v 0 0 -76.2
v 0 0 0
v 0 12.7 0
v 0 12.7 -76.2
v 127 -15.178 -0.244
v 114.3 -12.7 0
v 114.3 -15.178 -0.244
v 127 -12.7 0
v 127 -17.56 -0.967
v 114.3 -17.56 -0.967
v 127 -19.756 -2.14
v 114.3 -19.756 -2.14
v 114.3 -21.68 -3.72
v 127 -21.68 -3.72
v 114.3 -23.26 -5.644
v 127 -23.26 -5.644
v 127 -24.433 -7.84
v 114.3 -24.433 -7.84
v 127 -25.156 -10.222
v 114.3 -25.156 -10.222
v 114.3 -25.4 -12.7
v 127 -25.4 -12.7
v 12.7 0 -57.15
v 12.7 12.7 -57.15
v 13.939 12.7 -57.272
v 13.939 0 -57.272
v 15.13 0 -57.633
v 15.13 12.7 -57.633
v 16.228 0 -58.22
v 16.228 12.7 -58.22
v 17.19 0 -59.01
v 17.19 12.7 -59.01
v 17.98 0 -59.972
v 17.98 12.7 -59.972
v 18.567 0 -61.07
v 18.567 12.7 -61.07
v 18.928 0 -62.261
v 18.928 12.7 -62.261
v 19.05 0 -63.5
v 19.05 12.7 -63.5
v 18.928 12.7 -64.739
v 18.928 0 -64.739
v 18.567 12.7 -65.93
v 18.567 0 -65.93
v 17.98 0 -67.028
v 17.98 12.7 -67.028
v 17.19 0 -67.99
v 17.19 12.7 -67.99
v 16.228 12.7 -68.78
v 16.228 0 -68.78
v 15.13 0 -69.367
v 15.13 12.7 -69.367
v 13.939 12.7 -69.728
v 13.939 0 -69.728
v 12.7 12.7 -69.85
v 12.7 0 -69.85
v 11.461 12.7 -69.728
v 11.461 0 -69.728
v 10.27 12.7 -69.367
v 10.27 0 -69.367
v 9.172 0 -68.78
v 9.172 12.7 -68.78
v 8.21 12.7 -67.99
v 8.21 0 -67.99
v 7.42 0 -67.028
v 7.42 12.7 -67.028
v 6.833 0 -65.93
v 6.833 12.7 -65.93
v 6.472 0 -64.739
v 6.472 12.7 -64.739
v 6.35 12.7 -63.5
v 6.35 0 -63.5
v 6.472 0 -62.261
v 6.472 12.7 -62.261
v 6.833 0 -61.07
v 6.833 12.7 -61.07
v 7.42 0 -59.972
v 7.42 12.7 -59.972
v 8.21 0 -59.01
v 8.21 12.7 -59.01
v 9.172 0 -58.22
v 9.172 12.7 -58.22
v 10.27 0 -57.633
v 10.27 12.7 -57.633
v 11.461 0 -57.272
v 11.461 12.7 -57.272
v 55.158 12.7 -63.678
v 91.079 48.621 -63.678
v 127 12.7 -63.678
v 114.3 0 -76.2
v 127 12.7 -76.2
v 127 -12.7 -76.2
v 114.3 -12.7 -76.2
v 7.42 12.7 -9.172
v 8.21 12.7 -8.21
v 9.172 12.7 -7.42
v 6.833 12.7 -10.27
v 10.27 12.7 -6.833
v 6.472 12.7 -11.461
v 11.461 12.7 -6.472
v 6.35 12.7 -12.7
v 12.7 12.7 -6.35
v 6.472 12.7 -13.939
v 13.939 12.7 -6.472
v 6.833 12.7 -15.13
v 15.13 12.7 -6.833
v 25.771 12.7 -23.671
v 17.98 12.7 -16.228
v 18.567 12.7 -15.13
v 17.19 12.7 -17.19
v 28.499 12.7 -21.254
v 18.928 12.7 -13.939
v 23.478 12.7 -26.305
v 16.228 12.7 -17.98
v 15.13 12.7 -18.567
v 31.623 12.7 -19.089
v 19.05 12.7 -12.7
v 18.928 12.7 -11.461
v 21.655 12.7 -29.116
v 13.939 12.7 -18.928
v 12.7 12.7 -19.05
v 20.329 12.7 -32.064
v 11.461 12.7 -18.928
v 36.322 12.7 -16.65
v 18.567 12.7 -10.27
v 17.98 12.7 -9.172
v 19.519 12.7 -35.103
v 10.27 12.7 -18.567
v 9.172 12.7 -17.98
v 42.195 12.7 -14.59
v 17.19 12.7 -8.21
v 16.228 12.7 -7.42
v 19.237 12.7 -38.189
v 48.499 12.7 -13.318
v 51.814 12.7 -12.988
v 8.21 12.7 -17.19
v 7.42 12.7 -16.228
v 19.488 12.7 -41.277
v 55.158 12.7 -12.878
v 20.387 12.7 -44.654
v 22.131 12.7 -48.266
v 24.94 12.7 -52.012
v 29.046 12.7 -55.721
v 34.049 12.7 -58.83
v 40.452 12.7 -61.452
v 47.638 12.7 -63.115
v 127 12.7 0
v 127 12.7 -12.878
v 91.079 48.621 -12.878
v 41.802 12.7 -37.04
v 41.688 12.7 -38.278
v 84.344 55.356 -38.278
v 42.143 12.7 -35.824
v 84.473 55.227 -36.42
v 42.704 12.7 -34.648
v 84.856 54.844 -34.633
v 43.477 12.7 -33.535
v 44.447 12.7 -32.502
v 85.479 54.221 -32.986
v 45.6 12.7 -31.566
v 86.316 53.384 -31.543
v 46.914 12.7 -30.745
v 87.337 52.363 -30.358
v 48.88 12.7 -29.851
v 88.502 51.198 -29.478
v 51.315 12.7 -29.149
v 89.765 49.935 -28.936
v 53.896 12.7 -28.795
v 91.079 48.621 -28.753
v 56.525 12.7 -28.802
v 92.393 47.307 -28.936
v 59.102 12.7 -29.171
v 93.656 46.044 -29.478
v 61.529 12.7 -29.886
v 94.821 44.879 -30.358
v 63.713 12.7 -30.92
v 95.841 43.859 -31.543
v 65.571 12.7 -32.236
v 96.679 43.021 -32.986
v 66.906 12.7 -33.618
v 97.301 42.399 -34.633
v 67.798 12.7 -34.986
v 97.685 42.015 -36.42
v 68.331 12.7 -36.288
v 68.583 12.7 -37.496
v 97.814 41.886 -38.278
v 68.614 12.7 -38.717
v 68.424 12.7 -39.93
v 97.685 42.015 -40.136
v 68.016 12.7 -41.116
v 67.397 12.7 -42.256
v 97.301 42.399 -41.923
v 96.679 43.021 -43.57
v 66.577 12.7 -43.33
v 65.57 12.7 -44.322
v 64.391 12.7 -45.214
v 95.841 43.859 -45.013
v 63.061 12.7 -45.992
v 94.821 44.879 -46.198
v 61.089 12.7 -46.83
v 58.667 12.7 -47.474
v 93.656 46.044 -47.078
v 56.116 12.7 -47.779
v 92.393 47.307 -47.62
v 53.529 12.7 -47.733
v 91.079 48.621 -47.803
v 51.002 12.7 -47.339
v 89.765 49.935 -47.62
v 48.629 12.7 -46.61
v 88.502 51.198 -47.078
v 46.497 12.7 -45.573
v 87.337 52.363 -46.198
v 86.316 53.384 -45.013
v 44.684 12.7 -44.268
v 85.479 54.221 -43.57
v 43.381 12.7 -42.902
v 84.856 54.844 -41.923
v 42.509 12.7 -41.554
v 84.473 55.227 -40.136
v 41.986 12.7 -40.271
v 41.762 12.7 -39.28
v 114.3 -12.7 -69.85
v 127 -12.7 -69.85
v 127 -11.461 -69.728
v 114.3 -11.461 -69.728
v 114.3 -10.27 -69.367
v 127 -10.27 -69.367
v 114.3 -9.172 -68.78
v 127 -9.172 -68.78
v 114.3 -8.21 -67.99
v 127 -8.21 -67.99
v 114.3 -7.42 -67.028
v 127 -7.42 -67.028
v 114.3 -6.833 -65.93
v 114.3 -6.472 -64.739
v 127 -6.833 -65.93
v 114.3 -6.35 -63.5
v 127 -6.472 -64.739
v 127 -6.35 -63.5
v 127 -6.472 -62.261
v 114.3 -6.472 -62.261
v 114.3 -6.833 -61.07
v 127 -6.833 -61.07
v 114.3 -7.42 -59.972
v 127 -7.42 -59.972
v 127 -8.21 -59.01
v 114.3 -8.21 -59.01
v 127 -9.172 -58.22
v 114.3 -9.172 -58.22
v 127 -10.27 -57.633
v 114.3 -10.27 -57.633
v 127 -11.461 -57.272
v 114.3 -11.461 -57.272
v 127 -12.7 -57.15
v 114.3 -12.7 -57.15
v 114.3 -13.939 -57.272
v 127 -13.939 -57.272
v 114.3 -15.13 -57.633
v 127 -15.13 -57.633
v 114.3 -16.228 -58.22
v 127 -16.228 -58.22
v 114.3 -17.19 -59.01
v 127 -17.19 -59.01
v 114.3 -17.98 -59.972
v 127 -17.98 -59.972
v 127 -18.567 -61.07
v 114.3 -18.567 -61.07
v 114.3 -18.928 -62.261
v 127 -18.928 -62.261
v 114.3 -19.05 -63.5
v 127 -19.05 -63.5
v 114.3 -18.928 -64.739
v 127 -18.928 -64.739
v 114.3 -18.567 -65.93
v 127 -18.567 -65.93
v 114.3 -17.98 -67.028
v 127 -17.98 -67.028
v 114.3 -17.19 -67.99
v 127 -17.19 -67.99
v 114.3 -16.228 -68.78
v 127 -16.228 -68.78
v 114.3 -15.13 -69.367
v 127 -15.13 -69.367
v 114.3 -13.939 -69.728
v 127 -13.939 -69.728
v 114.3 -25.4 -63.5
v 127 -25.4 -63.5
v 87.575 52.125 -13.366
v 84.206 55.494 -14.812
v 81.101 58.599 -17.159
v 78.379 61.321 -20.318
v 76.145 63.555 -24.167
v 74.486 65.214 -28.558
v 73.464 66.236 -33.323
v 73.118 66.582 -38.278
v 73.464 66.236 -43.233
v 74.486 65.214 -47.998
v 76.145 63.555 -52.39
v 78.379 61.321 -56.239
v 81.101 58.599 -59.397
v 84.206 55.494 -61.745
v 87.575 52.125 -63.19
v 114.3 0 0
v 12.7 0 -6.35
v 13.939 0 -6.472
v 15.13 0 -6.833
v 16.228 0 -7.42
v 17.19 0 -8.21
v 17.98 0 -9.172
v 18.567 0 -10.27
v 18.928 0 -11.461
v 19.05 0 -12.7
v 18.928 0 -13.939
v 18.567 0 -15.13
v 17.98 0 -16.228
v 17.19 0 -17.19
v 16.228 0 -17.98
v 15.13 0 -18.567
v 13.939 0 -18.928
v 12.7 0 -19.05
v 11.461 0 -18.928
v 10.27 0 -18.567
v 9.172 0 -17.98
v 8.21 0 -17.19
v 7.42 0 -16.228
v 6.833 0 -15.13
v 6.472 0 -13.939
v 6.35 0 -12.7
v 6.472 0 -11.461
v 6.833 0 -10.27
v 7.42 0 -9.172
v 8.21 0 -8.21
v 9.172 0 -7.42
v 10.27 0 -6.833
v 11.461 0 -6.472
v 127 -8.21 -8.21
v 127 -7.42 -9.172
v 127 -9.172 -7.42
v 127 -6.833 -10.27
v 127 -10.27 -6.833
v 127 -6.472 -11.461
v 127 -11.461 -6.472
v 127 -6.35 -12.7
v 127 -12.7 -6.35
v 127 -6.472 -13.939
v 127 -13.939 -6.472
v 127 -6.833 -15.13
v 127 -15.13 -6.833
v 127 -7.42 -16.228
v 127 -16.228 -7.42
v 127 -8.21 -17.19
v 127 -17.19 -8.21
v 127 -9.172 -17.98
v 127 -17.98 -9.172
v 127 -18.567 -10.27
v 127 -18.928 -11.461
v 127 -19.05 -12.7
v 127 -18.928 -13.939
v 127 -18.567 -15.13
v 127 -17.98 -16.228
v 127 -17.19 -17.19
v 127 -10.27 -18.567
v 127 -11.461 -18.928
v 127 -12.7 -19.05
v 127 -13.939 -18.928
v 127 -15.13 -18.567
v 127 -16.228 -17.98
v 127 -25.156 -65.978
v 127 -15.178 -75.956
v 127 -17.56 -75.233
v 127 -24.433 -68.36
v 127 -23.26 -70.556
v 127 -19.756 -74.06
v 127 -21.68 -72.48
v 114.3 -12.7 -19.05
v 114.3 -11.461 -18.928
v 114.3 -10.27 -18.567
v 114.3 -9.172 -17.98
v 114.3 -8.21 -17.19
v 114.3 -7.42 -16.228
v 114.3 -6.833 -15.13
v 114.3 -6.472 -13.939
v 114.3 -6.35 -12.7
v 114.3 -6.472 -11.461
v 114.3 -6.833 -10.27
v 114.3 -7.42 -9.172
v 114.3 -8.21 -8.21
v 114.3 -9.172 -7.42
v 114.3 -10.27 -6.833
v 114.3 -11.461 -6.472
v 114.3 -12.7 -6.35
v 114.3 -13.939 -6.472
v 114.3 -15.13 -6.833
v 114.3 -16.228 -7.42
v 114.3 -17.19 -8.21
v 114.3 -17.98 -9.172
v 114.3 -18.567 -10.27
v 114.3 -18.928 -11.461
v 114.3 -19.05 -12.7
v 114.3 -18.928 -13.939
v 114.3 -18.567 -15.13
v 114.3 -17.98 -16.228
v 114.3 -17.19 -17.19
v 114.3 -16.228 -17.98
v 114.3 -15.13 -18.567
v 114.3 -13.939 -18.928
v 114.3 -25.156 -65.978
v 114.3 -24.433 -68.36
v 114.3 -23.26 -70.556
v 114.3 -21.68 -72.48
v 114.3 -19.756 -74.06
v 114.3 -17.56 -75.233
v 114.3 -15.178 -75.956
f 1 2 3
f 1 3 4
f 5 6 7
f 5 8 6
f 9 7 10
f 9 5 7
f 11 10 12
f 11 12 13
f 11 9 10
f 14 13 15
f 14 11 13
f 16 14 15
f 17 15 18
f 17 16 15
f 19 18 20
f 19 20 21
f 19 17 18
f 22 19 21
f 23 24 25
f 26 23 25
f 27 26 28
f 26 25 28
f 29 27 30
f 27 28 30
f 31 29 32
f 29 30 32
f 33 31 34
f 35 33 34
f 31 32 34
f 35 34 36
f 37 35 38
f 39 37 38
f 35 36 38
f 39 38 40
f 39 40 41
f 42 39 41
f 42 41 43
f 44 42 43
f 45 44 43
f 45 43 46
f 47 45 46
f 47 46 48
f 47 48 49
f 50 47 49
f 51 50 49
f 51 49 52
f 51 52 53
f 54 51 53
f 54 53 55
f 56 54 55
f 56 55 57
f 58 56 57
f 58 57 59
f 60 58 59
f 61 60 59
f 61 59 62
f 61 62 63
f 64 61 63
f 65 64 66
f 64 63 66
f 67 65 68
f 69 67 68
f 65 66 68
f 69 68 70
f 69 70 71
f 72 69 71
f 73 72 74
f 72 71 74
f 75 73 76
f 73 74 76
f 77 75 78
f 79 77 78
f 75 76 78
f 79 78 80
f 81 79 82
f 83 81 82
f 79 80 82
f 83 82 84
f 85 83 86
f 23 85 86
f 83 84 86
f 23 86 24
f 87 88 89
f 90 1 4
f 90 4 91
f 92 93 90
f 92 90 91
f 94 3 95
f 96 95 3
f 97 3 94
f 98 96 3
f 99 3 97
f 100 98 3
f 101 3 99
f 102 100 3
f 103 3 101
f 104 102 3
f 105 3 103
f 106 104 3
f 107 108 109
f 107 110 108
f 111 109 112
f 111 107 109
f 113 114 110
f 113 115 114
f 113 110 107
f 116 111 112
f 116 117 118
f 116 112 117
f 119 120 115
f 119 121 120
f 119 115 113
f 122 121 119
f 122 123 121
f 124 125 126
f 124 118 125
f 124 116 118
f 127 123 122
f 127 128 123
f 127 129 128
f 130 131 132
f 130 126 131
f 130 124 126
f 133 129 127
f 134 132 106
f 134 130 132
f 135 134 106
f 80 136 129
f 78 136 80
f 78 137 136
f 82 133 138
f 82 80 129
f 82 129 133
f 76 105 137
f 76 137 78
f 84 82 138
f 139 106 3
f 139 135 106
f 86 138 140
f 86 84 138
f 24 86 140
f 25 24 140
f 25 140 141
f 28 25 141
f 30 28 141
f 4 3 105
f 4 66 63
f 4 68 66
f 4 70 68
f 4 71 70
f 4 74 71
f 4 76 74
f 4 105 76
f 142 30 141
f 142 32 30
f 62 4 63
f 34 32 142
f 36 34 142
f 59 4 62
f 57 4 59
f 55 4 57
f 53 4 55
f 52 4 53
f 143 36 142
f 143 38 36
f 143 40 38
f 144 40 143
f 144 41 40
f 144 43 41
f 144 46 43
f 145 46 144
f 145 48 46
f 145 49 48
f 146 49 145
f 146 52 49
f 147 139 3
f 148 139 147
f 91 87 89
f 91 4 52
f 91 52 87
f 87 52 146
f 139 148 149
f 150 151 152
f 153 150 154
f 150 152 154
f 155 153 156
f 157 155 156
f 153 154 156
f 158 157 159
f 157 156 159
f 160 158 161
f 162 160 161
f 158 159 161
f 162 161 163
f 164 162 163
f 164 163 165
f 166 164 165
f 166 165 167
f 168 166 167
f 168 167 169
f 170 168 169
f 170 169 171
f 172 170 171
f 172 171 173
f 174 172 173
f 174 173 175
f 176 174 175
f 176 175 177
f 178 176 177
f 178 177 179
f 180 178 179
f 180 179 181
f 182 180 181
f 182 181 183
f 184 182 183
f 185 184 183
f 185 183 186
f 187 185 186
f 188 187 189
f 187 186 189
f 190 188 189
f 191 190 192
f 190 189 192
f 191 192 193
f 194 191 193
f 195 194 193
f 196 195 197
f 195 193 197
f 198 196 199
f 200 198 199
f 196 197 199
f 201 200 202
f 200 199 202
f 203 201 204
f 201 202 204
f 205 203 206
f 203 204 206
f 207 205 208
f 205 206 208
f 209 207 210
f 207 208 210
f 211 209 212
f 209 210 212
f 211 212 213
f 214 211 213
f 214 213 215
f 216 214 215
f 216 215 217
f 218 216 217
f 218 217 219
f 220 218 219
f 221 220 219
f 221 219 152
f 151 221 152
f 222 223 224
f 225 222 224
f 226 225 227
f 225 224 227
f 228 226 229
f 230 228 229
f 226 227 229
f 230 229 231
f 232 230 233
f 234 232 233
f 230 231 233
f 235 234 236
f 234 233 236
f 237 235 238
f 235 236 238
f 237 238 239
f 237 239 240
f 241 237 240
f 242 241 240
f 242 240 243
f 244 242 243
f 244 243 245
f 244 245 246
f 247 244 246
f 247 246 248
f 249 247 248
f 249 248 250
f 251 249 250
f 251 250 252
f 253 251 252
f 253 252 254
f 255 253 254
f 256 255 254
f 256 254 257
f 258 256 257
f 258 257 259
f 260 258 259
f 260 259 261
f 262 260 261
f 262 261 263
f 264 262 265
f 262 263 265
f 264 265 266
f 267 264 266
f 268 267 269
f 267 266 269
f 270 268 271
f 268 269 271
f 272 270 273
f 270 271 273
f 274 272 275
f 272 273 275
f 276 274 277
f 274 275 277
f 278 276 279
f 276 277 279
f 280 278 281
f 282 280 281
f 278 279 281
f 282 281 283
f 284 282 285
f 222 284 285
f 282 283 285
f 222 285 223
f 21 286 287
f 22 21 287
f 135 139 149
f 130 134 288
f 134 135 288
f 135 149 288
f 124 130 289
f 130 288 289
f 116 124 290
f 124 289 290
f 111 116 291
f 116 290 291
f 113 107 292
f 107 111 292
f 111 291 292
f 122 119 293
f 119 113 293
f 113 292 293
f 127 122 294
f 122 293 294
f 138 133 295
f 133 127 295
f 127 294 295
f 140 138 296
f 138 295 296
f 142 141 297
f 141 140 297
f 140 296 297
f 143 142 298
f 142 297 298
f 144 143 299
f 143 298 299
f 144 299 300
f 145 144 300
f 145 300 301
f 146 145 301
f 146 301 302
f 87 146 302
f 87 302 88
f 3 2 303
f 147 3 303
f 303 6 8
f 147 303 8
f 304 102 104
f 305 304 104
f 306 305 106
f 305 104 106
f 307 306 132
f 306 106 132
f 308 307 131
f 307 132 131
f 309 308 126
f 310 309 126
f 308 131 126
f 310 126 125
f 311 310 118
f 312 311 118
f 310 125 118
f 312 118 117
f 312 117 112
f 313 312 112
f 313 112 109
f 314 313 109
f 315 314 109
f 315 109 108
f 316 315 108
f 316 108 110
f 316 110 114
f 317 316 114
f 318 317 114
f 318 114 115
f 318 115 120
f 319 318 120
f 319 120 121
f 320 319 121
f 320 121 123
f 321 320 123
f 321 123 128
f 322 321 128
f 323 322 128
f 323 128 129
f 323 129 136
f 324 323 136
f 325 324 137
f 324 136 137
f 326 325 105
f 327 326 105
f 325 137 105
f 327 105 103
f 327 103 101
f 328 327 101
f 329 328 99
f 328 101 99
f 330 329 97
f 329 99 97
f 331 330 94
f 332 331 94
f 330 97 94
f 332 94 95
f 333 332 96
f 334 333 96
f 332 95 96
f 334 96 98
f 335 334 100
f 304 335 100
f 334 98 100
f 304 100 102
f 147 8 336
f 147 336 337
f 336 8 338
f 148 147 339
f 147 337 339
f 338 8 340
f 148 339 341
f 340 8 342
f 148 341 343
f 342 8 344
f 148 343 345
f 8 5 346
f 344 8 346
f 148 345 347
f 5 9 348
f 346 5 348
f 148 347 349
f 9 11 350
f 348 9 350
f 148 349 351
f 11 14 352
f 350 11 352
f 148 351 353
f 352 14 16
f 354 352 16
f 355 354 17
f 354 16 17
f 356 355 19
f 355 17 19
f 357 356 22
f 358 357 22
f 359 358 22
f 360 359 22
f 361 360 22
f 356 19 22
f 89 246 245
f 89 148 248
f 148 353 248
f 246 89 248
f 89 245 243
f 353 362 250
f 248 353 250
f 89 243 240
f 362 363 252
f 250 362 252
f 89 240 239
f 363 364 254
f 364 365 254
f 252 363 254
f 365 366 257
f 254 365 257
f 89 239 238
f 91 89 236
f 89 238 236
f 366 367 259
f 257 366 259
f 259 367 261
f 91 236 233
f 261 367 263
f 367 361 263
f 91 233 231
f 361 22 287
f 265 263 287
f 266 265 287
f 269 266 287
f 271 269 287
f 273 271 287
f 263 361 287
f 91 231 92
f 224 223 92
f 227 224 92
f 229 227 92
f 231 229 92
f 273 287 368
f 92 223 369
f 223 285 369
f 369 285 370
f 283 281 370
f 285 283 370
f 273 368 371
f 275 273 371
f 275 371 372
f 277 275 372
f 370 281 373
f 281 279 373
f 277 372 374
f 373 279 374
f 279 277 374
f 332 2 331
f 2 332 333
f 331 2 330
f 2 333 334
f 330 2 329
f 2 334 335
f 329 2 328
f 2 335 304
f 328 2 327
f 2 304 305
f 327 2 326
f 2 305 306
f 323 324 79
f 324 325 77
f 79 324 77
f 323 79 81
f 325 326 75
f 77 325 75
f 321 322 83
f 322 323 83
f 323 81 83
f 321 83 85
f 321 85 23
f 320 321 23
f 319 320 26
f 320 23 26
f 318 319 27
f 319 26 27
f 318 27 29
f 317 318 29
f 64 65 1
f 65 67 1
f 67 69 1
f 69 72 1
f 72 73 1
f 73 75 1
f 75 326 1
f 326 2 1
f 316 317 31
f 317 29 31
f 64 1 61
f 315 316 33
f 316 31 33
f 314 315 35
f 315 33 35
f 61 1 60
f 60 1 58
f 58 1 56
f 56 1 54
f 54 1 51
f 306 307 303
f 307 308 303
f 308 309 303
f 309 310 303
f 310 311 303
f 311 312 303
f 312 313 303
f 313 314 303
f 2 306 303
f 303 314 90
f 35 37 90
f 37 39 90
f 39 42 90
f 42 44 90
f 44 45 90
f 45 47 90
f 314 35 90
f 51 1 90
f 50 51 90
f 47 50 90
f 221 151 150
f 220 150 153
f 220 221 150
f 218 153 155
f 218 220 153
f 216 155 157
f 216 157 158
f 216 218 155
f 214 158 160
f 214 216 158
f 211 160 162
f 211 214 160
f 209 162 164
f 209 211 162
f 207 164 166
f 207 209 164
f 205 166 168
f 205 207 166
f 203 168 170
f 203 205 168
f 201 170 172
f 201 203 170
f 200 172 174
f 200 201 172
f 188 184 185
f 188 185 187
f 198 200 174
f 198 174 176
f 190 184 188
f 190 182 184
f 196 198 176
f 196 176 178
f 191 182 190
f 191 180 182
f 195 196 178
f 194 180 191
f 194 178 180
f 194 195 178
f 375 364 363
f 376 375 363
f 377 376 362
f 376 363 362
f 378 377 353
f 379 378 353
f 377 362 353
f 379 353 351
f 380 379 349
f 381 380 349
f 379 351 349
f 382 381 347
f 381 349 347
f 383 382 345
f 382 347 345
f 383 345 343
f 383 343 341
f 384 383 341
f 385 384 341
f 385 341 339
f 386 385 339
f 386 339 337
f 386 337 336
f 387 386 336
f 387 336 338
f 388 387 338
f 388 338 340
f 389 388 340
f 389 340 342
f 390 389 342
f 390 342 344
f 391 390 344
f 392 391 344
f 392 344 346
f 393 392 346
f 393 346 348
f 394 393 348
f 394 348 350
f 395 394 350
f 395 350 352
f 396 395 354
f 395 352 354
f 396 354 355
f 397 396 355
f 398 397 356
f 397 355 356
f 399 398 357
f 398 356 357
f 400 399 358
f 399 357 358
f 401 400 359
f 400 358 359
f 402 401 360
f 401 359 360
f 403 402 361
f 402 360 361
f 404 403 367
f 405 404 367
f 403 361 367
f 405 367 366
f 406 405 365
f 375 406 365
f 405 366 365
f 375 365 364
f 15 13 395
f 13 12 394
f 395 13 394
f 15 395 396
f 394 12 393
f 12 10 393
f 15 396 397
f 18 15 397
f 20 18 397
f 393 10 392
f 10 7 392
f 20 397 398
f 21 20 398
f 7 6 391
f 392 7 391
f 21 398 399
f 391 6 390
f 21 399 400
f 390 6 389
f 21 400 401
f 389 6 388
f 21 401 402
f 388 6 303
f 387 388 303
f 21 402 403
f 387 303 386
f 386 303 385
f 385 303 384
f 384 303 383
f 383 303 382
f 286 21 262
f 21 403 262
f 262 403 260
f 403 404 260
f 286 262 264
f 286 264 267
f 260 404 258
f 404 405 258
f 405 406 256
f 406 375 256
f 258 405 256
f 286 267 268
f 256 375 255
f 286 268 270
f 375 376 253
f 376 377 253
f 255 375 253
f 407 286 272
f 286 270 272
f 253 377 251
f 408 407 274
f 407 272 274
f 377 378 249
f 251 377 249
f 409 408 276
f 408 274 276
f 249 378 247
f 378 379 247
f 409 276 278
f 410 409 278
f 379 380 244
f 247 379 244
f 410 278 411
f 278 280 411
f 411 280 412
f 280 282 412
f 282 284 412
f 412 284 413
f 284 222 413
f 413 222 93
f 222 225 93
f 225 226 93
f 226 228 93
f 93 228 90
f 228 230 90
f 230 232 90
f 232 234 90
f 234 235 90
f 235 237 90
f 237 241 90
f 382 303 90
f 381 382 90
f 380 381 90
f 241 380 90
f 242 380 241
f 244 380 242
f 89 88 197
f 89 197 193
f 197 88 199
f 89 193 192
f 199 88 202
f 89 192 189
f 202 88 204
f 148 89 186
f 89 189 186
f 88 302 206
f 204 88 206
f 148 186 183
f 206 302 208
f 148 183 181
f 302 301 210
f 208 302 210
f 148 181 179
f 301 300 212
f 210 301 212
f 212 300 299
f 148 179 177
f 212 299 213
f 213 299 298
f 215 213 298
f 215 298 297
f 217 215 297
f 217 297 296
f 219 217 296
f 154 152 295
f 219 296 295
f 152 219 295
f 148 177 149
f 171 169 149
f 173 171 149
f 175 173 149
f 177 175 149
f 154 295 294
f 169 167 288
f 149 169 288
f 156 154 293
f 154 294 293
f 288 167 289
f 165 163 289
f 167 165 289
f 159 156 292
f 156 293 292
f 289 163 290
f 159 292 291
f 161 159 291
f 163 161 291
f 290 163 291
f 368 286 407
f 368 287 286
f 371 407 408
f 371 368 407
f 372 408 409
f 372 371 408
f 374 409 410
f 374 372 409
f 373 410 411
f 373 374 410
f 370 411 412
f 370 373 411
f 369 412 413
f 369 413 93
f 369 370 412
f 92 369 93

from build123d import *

# Parameters (mm, degrees)
SKETCH1_W           = 127
SKETCH1_H           = 76.2
BOSS_EXTRUDE1_DEPTH = 12.7
SKETCH2_W           = 12.7
SKETCH2_H           = 76.2
BOSS_EXTRUDE2_DEPTH = 38.1
FILLET1_R           = 12.7
FILLET2_R           = 12.7
BOSS_EXTRUDE3_REACH = 142.563
SKETCH7_R           = 9.525
SKETCH5_R           = 6.35
CUT_EXTRUDE1_DEPTH  = 38.1
SKETCH8_R           = 6.35
CUT_EXTRUDE2_DEPTH  = 38.1


with BuildPart() as part:
    # Sketch1 → Boss-Extrude1 (new body)
    with BuildSketch(Plane(origin=(0, 0, 0), x_dir=(1, 0, 0), z_dir=(0, 1, 0))):
        with Locations((63.5, 38.1)):
            Rectangle(SKETCH1_W, SKETCH1_H)
    extrude(amount=BOSS_EXTRUDE1_DEPTH)

    # Sketch2 → Boss-Extrude2 (add)
    with BuildSketch(Plane(origin=(0, 12.7, 0), x_dir=(1, 0, 0), z_dir=(0, 1, 0))):
        with Locations((120.65, 38.1)):
            Rectangle(SKETCH2_W, SKETCH2_H)
    extrude(amount=-BOSS_EXTRUDE2_DEPTH)

    # Fillet1
    fillet1_edges = [part.edges().sort_by_distance(p)[0] for p in [
        (120.65, -25.4, 0),
    ]]
    fillet(fillet1_edges, radius=FILLET1_R)

    # Fillet2
    fillet2_edges = [part.edges().sort_by_distance(p)[0] for p in [
        (120.65, -25.4, -76.2),
    ]]
    fillet(fillet2_edges, radius=FILLET2_R)

    # Boss-Extrude3: up to this face of the body (flat: up to its plane)
    boss_extrude3_end = Plane(part.part.faces().sort_by_distance((63.5, 12.7, -38.1))[0])
    # Sketch7 → Boss-Extrude3 (add, up to the picked face)
    with BuildSketch(Plane(origin=(69.85, 69.85, 0), x_dir=(0, 0, -1), z_dir=(0.7071067811865488, 0.7071067811865464, 0)), mode=Mode.PRIVATE) as boss_extrude3_sk1:
        with BuildLine():
            Line((63.678120433, -80.82230509), (12.878120433, -80.82230509))
            Line((12.878120433, -80.82230509), (12.878120433, -30.02230509))
            ThreePointArc((12.878120433, -30.02230509), (38.278120433, -4.62230509), (63.678120433, -30.02230509))
            Line((63.678120433, -30.02230509), (63.678120433, -80.82230509))
        make_face()
        with Locations(Location((38.278120433, -30.02230509, 0), (0, 0, 90))):
            Circle(SKETCH7_R, mode=Mode.SUBTRACT)
    boss_extrude3_tool1 = split(extrude(boss_extrude3_sk1.sketch, amount=-BOSS_EXTRUDE3_REACH, mode=Mode.PRIVATE), bisect_by=boss_extrude3_end, keep=Keep.BOTH, mode=Mode.PRIVATE)
    add(boss_extrude3_tool1.solids().sort_by(Axis((102.751477, 36.948523, -38.27812), (-0.7071067811865488, -0.7071067811865464, 0)))[0])

    # Sketch5 → Cut-Extrude1 (cut)
    with BuildSketch(Plane(origin=(0, 12.7, 0), x_dir=(1, 0, 0), z_dir=(0, 1, 0))):
        with Locations(Location((12.7, 63.5, 0), (0, 0, 270))):
            Circle(SKETCH5_R)
        with Locations(Location((12.7, 12.7, 0), (0, 0, 270))):
            Circle(SKETCH5_R)
    extrude(amount=-CUT_EXTRUDE1_DEPTH, mode=Mode.SUBTRACT)

    # Sketch8 → Cut-Extrude2 (cut)
    with BuildSketch(Plane(origin=(127, 0, 0), x_dir=(0, 0, -1), z_dir=(1, 0, 0))):
        with Locations((12.7, -12.7)):
            Circle(SKETCH8_R)
        with Locations((63.5, -12.7)):
            Circle(SKETCH8_R)
    extrude(amount=-CUT_EXTRUDE2_DEPTH, mode=Mode.SUBTRACT)


solid = part.part
